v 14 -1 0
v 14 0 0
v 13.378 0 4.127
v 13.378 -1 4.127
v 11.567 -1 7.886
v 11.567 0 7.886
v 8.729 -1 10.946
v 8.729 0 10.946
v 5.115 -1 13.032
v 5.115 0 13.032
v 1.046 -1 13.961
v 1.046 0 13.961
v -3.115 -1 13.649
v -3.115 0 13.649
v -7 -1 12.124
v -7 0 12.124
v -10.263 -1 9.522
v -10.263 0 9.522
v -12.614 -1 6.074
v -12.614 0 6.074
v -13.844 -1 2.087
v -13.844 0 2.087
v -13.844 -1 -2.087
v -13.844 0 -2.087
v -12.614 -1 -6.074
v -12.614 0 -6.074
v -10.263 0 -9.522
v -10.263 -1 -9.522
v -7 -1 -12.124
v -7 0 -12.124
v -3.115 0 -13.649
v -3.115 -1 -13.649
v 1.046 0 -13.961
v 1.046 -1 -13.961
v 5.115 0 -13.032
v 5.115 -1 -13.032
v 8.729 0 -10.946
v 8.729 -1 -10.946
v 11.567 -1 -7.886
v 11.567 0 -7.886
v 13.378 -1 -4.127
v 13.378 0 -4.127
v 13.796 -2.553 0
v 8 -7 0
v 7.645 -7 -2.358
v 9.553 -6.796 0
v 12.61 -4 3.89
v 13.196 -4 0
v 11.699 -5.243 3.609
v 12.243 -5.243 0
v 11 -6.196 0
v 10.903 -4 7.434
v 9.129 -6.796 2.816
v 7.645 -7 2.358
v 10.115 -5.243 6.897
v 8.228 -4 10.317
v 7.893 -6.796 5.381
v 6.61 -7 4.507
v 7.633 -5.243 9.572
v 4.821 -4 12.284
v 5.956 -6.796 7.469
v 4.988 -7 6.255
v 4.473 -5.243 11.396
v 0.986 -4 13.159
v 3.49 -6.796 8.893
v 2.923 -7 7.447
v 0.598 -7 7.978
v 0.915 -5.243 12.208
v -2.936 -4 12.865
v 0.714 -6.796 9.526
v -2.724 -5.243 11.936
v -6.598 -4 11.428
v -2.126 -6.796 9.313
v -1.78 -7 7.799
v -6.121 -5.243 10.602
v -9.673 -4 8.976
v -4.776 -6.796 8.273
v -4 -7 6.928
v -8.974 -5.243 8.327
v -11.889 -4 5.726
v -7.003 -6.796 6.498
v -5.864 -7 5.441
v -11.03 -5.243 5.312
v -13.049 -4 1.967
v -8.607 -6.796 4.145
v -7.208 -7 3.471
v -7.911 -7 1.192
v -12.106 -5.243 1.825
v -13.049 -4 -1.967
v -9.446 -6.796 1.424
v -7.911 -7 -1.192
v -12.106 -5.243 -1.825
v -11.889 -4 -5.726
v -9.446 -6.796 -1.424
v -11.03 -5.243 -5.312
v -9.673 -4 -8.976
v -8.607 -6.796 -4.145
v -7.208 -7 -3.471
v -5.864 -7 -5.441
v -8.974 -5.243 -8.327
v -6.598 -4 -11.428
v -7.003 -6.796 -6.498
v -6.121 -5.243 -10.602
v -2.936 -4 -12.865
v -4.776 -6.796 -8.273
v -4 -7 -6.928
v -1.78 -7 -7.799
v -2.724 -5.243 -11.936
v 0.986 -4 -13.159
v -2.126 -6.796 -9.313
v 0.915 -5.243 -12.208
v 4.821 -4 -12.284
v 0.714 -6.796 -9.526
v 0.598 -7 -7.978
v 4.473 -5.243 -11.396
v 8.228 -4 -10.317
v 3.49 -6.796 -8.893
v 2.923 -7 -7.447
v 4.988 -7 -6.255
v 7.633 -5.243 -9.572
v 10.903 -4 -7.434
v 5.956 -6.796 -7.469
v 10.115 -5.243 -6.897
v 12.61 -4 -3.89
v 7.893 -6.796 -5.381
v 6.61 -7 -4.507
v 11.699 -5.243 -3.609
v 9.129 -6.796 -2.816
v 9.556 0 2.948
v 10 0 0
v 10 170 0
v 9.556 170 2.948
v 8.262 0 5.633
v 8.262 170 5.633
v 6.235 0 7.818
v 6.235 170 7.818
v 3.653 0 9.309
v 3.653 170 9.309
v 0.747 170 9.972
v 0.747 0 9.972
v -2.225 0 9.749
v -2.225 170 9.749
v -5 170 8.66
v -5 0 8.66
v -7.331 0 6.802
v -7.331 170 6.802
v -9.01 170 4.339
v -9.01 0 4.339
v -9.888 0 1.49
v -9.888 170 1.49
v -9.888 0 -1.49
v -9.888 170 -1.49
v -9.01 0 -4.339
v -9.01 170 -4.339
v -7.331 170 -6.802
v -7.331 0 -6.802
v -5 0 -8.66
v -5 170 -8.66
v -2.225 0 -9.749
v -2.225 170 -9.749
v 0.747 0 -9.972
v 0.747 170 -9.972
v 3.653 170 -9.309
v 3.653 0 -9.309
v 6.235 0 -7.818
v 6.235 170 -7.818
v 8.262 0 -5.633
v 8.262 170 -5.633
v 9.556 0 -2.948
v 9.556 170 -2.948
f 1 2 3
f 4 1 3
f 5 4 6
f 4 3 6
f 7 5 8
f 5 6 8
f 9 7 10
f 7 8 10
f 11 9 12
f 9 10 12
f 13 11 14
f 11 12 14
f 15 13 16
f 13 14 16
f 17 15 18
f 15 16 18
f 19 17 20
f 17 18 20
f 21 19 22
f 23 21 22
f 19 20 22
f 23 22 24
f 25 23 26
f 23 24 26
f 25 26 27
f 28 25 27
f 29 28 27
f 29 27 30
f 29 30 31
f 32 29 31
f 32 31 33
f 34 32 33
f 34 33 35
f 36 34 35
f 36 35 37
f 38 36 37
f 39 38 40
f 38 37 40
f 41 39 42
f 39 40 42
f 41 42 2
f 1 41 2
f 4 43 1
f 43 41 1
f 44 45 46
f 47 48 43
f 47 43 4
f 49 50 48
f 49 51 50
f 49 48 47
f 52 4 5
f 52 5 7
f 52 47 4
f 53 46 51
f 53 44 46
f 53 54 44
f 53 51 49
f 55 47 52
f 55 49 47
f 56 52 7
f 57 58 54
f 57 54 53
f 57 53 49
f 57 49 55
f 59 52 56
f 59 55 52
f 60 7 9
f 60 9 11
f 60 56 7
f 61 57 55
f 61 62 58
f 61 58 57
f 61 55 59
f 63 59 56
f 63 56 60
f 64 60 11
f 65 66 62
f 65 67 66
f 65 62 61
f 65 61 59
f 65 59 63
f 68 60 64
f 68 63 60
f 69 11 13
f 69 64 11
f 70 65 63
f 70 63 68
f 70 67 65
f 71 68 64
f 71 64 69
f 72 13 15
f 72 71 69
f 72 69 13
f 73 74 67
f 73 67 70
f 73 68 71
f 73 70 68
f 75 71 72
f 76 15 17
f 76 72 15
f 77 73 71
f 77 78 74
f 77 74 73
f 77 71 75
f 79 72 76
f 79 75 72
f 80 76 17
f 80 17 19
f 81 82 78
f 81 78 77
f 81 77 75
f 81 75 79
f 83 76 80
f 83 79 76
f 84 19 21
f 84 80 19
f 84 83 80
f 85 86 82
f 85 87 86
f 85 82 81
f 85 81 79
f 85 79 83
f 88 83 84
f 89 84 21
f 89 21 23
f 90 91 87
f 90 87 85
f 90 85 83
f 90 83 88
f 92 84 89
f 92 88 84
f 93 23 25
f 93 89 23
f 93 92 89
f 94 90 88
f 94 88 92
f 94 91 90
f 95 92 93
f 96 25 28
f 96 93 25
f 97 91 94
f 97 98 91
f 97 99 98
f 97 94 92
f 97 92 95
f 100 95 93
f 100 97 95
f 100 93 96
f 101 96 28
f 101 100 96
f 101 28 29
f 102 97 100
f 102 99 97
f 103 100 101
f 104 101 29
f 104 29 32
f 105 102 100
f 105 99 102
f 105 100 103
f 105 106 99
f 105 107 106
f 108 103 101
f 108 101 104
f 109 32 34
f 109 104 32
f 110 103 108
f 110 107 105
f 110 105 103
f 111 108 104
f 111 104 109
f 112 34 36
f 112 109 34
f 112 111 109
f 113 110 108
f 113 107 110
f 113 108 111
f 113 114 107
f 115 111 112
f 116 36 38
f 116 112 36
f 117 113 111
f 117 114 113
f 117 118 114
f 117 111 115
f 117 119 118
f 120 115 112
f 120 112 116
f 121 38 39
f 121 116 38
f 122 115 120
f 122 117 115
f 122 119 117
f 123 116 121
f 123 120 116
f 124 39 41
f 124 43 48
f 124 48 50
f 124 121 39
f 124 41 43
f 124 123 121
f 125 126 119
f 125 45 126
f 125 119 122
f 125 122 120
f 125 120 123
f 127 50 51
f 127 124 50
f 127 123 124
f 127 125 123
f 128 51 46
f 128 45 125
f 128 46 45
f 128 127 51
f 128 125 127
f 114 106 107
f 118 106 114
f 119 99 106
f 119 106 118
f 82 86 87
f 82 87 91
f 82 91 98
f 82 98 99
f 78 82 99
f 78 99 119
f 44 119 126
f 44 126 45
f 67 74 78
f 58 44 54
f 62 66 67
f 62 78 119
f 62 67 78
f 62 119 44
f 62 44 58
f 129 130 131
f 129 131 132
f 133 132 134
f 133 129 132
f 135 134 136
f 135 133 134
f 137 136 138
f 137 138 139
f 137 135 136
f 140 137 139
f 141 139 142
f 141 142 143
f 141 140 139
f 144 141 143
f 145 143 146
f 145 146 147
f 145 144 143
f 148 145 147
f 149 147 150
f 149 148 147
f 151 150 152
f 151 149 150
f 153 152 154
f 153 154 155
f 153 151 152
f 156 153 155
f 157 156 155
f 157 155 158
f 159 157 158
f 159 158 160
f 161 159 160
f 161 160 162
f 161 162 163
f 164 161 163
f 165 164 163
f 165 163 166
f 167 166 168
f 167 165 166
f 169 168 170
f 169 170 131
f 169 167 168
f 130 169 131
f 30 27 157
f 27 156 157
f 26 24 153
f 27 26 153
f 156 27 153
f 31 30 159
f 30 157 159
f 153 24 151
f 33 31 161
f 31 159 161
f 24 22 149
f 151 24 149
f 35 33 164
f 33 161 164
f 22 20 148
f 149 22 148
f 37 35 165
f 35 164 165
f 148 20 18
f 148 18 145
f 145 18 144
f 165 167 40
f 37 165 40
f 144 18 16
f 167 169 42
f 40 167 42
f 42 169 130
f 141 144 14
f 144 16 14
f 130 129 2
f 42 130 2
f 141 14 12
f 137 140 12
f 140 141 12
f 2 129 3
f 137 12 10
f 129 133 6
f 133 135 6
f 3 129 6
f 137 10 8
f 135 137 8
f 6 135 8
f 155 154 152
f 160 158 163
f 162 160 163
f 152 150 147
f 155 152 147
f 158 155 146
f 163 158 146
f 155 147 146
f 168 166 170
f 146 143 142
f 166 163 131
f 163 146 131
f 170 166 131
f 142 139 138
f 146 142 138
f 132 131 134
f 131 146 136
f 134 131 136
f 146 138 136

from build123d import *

# Parameters (mm, degrees)
F0_R     = 10
F1_DEPTH = 170
F2_R     = 14
F3_DEPTH = 7
F4_R     = 6


with BuildPart() as f1:
    # F0 (on Front) → F1 (new body)
    with BuildSketch(Plane.XZ):
        Circle(F0_R)
    extrude(amount=-F1_DEPTH)

    # F2 (on Front) → F3 (join)
    with BuildSketch(Plane.XZ):
        Circle(F2_R)
    extrude(amount=F3_DEPTH)

    # F4
    f4_edges = [f1.edges().sort_by_distance(p)[0] for p in [
        (-14, -7, 0),
    ]]
    fillet(f4_edges, radius=F4_R)


solid = f1.part
